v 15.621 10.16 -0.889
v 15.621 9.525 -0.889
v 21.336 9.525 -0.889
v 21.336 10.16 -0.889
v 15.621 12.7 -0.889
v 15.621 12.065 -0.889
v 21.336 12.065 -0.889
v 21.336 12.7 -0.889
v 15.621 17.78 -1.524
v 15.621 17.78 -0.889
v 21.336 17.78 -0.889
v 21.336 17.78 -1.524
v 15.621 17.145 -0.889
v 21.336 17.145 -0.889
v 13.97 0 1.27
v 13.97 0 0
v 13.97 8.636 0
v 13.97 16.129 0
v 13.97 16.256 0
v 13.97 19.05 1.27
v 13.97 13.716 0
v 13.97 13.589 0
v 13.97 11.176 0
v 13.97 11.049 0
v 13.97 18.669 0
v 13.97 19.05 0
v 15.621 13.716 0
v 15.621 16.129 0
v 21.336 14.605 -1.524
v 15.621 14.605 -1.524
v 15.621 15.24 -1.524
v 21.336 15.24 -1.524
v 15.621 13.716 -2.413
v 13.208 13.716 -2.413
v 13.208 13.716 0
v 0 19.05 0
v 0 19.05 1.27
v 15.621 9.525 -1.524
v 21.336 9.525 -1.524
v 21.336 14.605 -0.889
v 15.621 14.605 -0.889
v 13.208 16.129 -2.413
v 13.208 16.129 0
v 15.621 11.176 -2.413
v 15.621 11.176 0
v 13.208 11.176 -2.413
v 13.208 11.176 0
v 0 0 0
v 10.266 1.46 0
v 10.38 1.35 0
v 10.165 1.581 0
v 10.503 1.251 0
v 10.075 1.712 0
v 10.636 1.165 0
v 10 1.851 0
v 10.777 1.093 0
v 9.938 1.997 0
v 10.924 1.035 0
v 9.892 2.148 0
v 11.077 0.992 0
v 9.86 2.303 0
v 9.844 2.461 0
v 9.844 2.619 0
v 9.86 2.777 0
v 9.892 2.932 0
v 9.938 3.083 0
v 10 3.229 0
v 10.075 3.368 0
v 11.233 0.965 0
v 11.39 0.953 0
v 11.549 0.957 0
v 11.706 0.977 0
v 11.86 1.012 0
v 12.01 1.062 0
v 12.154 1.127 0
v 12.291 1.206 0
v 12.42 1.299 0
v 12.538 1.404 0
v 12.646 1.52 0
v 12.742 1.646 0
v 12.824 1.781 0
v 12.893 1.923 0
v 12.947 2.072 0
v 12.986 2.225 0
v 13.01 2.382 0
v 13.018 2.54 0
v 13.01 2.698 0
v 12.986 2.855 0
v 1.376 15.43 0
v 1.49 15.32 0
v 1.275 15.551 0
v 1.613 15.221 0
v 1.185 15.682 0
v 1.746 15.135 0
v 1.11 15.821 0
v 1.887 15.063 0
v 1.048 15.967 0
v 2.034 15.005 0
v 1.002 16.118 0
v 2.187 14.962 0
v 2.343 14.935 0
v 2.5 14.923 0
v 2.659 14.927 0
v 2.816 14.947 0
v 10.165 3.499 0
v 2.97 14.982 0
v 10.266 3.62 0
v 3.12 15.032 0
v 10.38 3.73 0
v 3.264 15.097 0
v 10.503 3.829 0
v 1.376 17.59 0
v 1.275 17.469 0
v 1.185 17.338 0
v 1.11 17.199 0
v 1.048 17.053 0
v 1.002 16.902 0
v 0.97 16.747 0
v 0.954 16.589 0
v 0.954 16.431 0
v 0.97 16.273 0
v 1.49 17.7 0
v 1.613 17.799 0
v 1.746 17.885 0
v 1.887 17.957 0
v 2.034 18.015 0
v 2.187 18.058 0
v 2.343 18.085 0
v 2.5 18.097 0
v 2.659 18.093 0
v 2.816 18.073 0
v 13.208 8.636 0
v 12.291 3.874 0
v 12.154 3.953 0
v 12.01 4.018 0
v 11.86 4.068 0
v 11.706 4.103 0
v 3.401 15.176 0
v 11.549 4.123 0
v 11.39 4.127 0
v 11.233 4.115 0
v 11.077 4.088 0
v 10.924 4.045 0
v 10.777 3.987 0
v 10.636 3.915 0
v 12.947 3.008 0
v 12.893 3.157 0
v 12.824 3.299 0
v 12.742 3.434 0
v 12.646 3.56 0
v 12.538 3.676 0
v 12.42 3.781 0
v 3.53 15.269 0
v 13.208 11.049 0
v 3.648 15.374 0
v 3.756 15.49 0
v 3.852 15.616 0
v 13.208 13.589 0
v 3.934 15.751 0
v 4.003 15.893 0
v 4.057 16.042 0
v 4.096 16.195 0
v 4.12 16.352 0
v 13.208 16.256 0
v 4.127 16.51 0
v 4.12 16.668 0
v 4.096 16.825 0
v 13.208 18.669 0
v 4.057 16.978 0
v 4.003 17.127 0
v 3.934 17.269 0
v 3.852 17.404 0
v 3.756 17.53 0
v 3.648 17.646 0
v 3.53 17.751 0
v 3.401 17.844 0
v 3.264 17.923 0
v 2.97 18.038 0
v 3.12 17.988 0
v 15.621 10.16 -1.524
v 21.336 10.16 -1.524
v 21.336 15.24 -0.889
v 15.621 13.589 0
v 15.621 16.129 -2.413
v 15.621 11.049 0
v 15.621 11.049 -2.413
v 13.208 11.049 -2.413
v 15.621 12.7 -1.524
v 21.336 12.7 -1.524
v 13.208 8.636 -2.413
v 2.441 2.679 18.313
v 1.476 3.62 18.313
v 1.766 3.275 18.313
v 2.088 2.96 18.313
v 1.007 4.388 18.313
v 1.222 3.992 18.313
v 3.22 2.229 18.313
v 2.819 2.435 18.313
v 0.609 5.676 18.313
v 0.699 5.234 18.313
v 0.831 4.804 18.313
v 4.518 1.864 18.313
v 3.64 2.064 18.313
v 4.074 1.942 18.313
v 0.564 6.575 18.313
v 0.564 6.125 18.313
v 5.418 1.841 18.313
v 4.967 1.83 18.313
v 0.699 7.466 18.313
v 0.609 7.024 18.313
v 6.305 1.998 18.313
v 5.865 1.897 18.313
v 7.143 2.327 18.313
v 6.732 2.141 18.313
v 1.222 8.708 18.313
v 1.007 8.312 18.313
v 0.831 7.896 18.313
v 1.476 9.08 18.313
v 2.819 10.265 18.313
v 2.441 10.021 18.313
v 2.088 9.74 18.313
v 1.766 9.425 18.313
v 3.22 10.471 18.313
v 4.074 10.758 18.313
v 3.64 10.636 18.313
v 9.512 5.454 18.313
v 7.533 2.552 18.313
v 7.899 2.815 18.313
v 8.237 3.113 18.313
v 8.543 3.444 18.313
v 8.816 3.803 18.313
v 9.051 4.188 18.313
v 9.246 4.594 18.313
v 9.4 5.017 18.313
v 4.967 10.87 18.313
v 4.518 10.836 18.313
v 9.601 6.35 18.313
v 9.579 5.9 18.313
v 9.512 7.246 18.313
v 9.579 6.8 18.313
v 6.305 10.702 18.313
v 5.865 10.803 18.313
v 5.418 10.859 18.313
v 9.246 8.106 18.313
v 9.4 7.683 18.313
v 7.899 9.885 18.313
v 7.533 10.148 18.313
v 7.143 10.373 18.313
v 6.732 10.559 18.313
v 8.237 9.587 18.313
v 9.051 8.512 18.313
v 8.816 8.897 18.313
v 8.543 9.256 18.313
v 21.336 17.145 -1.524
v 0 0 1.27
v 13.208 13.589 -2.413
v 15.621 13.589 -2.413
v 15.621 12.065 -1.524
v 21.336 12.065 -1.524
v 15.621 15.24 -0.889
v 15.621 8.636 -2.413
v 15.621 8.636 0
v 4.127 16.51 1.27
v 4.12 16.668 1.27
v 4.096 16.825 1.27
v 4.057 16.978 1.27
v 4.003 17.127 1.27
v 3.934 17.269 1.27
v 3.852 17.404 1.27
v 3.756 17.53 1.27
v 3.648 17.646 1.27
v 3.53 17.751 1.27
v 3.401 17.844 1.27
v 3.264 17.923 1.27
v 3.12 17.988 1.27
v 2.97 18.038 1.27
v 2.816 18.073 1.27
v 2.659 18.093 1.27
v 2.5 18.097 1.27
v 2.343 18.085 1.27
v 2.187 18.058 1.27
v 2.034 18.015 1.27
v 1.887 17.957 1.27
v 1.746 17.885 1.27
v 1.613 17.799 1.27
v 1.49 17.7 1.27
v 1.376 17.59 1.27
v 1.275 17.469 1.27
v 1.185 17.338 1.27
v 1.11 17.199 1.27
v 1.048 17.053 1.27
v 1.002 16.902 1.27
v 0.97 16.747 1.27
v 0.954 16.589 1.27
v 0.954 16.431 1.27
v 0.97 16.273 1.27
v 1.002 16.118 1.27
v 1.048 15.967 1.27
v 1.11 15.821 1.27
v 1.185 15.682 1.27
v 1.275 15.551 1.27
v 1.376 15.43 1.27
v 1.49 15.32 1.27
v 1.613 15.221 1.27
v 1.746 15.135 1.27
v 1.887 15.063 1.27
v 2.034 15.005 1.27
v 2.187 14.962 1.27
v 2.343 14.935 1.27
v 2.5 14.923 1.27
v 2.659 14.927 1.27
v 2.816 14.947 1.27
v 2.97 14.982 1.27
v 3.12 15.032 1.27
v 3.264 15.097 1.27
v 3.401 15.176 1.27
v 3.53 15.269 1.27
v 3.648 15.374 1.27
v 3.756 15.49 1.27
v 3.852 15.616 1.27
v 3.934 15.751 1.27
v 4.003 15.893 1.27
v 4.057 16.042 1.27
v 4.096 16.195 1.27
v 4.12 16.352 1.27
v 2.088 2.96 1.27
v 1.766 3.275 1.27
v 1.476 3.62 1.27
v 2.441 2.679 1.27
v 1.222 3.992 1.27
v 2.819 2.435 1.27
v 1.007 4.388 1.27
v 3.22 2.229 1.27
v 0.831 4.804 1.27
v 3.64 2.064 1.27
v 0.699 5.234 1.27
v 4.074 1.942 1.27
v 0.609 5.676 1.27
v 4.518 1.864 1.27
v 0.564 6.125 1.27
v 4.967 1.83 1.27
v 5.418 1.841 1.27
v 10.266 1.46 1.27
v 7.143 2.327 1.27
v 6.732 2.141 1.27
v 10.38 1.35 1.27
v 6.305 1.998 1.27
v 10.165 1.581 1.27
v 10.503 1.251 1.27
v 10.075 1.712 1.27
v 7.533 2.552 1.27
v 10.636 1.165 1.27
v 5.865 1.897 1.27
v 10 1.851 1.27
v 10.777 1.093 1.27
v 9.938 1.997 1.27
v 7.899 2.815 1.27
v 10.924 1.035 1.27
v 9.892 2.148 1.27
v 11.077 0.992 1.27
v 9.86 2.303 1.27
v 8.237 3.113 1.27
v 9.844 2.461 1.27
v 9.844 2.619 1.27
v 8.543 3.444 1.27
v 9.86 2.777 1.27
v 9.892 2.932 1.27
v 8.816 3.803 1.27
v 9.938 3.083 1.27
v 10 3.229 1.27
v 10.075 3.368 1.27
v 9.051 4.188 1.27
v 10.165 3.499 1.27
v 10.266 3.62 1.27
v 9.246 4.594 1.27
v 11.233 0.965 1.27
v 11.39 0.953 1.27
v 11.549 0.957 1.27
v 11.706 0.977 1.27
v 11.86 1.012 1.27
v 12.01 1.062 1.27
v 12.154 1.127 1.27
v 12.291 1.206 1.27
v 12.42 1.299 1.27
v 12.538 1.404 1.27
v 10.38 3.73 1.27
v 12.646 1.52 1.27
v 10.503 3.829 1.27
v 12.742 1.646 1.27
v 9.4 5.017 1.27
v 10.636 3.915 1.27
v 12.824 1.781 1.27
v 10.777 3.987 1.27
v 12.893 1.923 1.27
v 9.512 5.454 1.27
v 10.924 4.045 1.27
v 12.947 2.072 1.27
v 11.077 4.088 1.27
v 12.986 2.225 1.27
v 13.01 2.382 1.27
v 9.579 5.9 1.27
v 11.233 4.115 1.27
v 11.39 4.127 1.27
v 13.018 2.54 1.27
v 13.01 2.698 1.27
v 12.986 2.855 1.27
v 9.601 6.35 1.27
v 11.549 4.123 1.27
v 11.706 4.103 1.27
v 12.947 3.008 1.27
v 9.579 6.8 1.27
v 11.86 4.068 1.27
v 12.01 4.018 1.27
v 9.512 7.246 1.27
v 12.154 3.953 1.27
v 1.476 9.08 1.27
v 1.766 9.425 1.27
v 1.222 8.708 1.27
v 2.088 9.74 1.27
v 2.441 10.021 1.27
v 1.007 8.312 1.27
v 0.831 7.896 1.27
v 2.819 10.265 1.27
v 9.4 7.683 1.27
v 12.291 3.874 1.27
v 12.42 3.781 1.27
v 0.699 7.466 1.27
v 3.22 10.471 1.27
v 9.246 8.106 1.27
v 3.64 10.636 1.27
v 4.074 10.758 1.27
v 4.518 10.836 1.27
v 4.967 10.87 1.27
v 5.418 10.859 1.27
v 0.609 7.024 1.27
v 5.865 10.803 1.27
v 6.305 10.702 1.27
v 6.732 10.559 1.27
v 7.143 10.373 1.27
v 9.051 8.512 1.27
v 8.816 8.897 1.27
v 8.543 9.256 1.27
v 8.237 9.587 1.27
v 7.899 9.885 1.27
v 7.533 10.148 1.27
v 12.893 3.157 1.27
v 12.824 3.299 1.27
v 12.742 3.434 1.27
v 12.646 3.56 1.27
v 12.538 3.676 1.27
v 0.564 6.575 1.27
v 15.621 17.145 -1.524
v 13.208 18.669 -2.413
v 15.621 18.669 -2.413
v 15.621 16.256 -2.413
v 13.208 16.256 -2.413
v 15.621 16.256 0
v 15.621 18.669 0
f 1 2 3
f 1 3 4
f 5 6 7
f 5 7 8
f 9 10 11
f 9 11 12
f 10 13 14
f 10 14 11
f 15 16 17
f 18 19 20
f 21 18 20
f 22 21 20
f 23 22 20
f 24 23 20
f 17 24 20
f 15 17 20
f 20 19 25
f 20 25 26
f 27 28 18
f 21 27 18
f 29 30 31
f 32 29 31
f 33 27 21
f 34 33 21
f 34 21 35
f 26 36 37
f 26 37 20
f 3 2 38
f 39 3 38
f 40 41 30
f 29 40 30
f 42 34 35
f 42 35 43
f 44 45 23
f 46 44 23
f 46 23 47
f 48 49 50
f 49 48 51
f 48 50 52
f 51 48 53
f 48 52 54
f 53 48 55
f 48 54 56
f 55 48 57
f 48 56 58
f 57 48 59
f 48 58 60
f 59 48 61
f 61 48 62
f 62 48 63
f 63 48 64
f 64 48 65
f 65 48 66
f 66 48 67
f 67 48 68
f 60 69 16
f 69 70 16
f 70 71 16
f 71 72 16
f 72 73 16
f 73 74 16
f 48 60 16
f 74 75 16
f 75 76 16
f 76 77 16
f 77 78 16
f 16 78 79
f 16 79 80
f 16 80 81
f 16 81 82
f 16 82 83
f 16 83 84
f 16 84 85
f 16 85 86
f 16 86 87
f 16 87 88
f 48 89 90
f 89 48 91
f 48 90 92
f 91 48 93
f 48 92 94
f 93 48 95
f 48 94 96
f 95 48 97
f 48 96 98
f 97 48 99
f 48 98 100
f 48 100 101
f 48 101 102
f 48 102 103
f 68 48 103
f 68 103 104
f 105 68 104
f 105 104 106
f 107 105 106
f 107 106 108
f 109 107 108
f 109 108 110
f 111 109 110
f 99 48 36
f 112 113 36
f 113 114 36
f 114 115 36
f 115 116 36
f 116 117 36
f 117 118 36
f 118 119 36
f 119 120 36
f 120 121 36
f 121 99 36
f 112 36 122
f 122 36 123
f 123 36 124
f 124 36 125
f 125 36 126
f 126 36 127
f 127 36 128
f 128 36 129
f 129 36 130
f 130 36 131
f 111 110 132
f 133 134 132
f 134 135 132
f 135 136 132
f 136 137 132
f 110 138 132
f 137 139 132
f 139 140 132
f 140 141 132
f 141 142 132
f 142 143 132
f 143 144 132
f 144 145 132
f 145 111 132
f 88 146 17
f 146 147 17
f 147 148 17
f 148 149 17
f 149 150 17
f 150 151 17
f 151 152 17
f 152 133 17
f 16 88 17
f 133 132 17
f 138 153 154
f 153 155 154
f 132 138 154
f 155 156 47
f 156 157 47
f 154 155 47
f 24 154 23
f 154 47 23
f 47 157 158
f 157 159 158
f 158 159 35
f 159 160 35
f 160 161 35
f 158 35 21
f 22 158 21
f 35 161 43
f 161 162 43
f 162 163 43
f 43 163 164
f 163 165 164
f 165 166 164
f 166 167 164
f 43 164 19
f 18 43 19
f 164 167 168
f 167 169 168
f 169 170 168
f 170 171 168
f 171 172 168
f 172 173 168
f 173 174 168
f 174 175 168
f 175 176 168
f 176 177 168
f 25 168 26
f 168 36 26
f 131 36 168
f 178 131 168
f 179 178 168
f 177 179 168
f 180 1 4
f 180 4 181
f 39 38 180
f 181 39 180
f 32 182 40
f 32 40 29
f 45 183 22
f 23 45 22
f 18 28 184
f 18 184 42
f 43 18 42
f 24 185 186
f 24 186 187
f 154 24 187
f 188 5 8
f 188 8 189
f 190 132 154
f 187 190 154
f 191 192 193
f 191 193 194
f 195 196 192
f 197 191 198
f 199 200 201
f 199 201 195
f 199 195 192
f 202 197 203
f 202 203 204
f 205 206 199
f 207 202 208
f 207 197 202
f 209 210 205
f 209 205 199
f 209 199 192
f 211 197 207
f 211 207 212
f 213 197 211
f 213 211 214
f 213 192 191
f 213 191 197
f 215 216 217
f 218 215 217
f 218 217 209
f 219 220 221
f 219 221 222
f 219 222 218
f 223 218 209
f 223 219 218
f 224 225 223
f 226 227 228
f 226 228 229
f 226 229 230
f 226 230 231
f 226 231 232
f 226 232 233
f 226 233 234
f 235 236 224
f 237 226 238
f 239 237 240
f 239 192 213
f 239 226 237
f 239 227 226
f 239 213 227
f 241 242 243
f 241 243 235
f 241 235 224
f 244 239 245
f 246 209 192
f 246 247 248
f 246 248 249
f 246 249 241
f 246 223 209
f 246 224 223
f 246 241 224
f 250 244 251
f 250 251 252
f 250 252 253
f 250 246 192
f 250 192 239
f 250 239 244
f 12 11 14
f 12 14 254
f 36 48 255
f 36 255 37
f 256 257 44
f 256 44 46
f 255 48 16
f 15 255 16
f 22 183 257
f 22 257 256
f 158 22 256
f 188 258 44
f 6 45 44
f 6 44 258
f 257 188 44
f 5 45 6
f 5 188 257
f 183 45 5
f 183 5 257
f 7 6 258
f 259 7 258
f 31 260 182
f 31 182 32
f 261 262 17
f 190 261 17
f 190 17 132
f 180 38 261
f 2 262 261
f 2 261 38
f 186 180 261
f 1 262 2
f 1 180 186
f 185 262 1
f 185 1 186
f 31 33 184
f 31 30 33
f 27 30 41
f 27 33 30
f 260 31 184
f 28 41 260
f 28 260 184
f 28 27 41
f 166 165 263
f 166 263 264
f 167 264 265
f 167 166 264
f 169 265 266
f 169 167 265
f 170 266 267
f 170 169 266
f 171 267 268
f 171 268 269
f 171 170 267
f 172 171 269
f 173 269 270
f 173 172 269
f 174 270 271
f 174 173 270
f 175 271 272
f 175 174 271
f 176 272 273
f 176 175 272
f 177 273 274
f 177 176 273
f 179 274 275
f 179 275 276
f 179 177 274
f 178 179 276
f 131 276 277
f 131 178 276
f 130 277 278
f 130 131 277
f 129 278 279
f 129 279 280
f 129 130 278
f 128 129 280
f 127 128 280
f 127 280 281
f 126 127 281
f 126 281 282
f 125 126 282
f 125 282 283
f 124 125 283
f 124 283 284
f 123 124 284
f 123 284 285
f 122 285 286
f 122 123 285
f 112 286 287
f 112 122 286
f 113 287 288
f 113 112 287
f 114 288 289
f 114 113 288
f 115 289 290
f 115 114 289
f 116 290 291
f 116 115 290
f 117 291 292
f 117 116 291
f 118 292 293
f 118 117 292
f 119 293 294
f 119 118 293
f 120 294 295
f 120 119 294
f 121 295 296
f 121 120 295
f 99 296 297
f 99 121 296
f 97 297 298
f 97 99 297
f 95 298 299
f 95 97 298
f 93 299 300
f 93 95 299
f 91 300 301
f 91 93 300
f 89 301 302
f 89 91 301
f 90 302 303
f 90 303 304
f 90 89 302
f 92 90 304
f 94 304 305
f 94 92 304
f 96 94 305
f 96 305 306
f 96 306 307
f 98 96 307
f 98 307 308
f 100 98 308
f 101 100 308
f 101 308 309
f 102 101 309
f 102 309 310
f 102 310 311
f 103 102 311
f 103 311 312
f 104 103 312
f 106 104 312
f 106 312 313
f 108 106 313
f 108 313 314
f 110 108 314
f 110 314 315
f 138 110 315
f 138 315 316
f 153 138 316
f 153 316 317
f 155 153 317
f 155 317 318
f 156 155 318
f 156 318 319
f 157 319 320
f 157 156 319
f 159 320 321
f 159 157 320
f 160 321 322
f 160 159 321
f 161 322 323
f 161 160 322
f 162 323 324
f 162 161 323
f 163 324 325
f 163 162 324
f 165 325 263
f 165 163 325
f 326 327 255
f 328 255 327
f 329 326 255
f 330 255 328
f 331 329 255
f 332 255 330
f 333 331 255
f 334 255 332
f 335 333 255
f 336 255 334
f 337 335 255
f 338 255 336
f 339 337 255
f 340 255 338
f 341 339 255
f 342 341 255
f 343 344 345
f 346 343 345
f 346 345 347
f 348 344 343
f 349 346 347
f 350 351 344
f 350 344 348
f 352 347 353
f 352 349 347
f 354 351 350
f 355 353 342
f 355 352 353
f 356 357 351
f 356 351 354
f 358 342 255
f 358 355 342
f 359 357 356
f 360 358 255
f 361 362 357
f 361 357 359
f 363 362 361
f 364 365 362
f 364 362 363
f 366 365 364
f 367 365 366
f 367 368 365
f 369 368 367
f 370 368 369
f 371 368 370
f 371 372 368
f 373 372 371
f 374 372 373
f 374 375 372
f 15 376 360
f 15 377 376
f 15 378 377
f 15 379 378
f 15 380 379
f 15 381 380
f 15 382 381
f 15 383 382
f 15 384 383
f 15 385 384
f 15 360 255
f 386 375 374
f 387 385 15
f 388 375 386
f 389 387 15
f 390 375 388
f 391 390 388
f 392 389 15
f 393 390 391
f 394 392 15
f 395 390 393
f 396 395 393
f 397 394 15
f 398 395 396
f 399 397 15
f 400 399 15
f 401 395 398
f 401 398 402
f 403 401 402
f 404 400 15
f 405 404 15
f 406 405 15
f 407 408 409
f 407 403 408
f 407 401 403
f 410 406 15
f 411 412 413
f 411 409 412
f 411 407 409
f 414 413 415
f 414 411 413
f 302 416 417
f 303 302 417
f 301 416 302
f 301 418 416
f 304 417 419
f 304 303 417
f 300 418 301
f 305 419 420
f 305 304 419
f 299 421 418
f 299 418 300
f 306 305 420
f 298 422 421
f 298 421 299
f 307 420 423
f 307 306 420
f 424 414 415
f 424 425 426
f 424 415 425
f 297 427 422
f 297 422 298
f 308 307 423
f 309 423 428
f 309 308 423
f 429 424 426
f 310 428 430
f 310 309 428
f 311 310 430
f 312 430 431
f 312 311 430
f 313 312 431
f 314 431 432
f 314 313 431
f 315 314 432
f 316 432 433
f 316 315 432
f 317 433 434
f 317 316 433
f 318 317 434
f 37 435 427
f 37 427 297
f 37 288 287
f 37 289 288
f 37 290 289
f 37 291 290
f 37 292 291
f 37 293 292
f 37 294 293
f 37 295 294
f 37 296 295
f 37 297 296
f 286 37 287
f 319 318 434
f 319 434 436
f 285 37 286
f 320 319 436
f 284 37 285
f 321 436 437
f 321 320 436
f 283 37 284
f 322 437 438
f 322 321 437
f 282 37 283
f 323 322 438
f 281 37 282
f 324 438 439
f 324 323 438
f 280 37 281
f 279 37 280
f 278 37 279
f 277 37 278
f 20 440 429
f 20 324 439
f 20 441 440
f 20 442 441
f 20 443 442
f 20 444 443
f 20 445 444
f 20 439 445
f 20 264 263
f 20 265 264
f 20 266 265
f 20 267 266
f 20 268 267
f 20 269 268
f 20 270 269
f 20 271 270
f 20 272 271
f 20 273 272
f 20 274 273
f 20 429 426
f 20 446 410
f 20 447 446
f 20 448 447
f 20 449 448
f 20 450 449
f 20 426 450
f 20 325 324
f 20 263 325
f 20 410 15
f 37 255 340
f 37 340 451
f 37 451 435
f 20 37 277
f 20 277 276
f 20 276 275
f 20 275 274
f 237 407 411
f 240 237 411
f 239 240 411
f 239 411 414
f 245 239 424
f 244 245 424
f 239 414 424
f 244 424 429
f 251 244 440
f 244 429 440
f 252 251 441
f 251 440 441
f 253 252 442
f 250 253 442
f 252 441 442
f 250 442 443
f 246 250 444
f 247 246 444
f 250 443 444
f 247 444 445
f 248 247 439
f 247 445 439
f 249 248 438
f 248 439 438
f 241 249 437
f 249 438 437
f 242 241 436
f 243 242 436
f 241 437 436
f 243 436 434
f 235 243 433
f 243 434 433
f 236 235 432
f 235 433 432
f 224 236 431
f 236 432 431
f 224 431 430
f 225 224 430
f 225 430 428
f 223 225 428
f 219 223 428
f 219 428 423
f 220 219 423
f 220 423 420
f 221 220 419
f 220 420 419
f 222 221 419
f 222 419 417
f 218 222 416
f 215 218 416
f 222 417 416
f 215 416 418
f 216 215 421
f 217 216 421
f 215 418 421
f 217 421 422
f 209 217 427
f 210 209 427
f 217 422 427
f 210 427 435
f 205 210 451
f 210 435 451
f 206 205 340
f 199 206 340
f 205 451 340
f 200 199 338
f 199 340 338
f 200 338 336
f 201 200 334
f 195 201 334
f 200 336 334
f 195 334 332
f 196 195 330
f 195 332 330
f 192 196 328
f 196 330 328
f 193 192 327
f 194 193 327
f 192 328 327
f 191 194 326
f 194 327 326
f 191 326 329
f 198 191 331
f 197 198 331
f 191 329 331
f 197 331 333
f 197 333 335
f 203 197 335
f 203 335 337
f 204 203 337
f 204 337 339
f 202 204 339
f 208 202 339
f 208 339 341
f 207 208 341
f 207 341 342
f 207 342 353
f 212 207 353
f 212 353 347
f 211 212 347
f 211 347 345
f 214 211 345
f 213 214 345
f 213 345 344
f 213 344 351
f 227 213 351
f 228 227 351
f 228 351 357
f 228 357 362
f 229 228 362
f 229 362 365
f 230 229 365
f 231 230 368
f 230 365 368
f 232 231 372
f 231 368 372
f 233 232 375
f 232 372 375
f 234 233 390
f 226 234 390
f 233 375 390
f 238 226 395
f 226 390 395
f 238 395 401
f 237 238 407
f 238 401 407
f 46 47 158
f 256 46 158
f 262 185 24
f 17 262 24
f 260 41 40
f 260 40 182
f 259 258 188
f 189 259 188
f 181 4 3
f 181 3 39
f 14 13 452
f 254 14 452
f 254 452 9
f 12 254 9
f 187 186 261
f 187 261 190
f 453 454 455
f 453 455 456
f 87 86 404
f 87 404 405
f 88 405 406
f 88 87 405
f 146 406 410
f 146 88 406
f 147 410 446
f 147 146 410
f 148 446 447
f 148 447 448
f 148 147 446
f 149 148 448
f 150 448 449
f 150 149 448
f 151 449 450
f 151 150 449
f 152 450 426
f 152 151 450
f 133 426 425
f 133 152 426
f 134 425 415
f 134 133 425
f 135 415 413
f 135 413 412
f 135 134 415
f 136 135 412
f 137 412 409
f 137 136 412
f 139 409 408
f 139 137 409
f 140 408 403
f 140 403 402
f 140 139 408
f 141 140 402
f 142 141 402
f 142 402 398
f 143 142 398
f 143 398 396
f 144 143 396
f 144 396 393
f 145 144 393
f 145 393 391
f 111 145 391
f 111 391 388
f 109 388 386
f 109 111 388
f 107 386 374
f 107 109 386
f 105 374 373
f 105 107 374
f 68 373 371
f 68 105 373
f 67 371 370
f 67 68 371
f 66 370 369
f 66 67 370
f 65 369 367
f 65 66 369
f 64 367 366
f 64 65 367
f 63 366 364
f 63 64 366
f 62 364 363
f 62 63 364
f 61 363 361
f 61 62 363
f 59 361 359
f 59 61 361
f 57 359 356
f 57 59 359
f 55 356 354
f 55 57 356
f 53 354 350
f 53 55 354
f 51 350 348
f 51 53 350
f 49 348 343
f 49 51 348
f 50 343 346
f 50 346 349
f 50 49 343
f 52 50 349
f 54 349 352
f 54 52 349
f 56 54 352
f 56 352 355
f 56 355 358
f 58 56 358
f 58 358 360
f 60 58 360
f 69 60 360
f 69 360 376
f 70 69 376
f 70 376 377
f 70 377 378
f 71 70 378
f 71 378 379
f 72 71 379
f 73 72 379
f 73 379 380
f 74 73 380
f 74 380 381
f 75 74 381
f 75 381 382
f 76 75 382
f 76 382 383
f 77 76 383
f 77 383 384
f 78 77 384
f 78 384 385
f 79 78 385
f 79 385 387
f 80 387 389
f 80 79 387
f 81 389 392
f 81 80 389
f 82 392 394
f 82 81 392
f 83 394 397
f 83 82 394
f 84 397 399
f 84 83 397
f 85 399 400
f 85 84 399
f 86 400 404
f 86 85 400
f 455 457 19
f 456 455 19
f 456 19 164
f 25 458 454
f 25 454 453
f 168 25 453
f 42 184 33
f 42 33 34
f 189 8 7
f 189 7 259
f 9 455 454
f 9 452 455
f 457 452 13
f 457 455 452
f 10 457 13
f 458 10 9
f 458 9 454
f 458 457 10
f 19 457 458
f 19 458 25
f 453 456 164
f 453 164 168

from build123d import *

# Parameters (mm, degrees)
SKETCH1_W           = 13.97
SKETCH1_H           = 19.05
SKETCH1_R           = 1.5875
BOSS_EXTRUDE1_DEPTH = 1.27
SKETCH2_R           = 4.5212
BOSS_EXTRUDE2_DEPTH = 17.0434
SKETCH3_W           = 2.413
SKETCH3_H           = 2.413
BOSS_EXTRUDE3_DEPTH = 2.413
SKETCH4_W           = 0.635
SKETCH4_H           = 0.635
BOSS_EXTRUDE4_DEPTH = 5.715


with BuildPart() as part:
    # Sketch1 → Boss-Extrude1 (new body)
    with BuildSketch(Plane.XY):
        with Locations((6.985, 9.525)):
            Rectangle(SKETCH1_W, SKETCH1_H)
        with Locations((2.54, 16.51)):
            Circle(SKETCH1_R, mode=Mode.SUBTRACT)
        with Locations((11.43, 2.54)):
            Circle(SKETCH1_R, mode=Mode.SUBTRACT)
    extrude(amount=BOSS_EXTRUDE1_DEPTH)

    # Sketch2 → Boss-Extrude2 (add)
    with BuildSketch(Plane.XY.offset(1.27)):
        with Locations((5.08, 6.35)):
            Circle(SKETCH2_R)
    extrude(amount=BOSS_EXTRUDE2_DEPTH)

    # Sketch3 → Boss-Extrude3 (add)
    with BuildSketch(Plane(origin=(0, 0, 0), x_dir=(-1, 0, 0), z_dir=(0, 0, -1))):
        with Locations((-14.4145, 9.8425)):
            Rectangle(SKETCH3_W, SKETCH3_H)
        with Locations((-14.4145, 12.3825)):
            Rectangle(SKETCH3_W, SKETCH3_H)
        with Locations((-14.4145, 14.9225)):
            Rectangle(SKETCH3_W, SKETCH3_H)
        with Locations((-14.4145, 17.4625)):
            Rectangle(SKETCH3_W, SKETCH3_H)
    extrude(amount=BOSS_EXTRUDE3_DEPTH)

    # Sketch4 → Boss-Extrude4 (add)
    with BuildSketch(Plane(origin=(15.621, 0, 0), x_dir=(0, 0, -1), z_dir=(1, 0, 0))):
        with Locations((1.2065, 9.8425)):
            Rectangle(SKETCH4_W, SKETCH4_H)
        with Locations((1.2065, 12.3825)):
            Rectangle(SKETCH4_W, SKETCH4_H)
        with Locations((1.2065, 14.9225)):
            Rectangle(SKETCH4_W, SKETCH4_H)
        with Locations((1.2065, 17.4625)):
            Rectangle(SKETCH4_W, SKETCH4_H)
    extrude(amount=BOSS_EXTRUDE4_DEPTH)


solid = part.part
